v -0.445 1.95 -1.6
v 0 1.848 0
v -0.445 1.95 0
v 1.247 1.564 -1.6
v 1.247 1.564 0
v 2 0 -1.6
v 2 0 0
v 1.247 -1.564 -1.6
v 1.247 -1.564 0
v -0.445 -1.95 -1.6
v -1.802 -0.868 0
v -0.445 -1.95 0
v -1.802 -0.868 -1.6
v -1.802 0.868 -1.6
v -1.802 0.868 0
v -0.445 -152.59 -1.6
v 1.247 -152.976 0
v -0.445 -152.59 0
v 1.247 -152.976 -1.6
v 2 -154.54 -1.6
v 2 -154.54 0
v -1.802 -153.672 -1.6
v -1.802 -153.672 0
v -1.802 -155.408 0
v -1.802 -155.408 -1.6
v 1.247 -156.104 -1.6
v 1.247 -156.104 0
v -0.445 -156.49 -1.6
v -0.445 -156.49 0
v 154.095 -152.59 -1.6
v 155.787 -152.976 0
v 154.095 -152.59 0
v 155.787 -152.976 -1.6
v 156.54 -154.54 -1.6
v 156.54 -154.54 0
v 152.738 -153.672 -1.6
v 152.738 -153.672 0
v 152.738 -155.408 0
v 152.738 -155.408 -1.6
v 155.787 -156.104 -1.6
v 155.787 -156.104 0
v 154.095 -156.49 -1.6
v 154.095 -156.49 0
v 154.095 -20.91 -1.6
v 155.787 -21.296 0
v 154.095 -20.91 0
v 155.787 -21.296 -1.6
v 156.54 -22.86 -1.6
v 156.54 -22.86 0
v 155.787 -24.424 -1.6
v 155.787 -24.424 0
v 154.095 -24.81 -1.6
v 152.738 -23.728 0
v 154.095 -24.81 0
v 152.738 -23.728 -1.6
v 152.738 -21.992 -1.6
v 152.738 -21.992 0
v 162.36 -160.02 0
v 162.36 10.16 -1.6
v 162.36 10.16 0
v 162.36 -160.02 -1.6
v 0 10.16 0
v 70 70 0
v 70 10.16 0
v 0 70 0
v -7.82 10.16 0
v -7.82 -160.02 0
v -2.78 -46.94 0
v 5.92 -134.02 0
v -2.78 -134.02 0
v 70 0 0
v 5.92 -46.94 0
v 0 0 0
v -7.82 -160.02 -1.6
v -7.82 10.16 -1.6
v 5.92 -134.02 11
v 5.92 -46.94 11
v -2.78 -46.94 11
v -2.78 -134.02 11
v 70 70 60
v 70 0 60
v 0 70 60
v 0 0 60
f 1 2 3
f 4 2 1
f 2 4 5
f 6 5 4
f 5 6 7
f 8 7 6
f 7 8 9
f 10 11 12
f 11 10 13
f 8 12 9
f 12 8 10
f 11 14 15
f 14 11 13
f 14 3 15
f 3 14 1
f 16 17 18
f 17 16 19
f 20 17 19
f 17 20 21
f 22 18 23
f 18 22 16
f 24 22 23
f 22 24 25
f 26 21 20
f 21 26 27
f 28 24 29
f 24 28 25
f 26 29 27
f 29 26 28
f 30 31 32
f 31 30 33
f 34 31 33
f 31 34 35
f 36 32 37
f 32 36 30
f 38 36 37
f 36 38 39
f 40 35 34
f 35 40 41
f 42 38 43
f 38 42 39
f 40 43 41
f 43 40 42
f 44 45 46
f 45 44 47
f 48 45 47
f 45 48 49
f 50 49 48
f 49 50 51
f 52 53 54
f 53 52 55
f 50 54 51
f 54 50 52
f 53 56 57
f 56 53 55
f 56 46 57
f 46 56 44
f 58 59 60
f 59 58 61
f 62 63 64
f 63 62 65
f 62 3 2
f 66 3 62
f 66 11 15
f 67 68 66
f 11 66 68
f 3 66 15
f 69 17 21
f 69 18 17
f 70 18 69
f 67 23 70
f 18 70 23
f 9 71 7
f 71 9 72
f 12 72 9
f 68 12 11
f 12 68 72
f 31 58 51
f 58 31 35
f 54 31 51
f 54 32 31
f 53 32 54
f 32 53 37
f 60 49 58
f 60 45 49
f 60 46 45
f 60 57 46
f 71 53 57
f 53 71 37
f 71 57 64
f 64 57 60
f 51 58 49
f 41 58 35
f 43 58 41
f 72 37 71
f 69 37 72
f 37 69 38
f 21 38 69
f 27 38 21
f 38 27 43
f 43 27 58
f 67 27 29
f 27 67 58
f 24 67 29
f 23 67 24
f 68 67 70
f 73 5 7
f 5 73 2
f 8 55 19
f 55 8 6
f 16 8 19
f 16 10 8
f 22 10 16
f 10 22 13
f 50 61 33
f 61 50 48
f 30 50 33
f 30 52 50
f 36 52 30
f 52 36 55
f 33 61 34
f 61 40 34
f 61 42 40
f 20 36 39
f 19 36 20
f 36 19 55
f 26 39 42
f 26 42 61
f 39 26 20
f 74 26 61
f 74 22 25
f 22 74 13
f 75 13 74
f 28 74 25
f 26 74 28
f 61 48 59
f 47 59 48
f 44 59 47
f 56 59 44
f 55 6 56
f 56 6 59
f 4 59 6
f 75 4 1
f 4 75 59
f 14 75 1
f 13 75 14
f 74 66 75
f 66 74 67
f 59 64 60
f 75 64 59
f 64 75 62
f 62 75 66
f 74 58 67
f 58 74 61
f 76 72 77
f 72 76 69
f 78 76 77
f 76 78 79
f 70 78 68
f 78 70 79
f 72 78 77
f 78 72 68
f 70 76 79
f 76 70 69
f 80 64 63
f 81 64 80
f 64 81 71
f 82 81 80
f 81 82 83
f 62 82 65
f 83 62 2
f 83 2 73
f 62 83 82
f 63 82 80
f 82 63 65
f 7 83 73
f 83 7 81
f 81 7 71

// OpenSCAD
difference() {
	translate([(154.54-170.18)/2, 10.16-170.18, -1.6])
		color([.4,1,.4])
			cube([170.18, 170.18, 1.6]);

	translate([0,0,-1.7]) {
		cylinder(d=4, h=2);
		translate([0,-154.54, 0])
			cylinder(d=4, h=2);
		translate([154.54,-154.54, 0])
			cylinder(d=4, h=2);
		translate([154.54,-22.86, 0])
			cylinder(d=4, h=2);
	}
}
PCIe=71.65+1.78+11.65+2;
translate([1.57-8.7/2, -46.94-PCIe, 0]) {
	color([.3,.3,.3])
		cube([8.7,PCIe,11]);
}

color([.3,.3,.3])
	cube([70,70,60]);
